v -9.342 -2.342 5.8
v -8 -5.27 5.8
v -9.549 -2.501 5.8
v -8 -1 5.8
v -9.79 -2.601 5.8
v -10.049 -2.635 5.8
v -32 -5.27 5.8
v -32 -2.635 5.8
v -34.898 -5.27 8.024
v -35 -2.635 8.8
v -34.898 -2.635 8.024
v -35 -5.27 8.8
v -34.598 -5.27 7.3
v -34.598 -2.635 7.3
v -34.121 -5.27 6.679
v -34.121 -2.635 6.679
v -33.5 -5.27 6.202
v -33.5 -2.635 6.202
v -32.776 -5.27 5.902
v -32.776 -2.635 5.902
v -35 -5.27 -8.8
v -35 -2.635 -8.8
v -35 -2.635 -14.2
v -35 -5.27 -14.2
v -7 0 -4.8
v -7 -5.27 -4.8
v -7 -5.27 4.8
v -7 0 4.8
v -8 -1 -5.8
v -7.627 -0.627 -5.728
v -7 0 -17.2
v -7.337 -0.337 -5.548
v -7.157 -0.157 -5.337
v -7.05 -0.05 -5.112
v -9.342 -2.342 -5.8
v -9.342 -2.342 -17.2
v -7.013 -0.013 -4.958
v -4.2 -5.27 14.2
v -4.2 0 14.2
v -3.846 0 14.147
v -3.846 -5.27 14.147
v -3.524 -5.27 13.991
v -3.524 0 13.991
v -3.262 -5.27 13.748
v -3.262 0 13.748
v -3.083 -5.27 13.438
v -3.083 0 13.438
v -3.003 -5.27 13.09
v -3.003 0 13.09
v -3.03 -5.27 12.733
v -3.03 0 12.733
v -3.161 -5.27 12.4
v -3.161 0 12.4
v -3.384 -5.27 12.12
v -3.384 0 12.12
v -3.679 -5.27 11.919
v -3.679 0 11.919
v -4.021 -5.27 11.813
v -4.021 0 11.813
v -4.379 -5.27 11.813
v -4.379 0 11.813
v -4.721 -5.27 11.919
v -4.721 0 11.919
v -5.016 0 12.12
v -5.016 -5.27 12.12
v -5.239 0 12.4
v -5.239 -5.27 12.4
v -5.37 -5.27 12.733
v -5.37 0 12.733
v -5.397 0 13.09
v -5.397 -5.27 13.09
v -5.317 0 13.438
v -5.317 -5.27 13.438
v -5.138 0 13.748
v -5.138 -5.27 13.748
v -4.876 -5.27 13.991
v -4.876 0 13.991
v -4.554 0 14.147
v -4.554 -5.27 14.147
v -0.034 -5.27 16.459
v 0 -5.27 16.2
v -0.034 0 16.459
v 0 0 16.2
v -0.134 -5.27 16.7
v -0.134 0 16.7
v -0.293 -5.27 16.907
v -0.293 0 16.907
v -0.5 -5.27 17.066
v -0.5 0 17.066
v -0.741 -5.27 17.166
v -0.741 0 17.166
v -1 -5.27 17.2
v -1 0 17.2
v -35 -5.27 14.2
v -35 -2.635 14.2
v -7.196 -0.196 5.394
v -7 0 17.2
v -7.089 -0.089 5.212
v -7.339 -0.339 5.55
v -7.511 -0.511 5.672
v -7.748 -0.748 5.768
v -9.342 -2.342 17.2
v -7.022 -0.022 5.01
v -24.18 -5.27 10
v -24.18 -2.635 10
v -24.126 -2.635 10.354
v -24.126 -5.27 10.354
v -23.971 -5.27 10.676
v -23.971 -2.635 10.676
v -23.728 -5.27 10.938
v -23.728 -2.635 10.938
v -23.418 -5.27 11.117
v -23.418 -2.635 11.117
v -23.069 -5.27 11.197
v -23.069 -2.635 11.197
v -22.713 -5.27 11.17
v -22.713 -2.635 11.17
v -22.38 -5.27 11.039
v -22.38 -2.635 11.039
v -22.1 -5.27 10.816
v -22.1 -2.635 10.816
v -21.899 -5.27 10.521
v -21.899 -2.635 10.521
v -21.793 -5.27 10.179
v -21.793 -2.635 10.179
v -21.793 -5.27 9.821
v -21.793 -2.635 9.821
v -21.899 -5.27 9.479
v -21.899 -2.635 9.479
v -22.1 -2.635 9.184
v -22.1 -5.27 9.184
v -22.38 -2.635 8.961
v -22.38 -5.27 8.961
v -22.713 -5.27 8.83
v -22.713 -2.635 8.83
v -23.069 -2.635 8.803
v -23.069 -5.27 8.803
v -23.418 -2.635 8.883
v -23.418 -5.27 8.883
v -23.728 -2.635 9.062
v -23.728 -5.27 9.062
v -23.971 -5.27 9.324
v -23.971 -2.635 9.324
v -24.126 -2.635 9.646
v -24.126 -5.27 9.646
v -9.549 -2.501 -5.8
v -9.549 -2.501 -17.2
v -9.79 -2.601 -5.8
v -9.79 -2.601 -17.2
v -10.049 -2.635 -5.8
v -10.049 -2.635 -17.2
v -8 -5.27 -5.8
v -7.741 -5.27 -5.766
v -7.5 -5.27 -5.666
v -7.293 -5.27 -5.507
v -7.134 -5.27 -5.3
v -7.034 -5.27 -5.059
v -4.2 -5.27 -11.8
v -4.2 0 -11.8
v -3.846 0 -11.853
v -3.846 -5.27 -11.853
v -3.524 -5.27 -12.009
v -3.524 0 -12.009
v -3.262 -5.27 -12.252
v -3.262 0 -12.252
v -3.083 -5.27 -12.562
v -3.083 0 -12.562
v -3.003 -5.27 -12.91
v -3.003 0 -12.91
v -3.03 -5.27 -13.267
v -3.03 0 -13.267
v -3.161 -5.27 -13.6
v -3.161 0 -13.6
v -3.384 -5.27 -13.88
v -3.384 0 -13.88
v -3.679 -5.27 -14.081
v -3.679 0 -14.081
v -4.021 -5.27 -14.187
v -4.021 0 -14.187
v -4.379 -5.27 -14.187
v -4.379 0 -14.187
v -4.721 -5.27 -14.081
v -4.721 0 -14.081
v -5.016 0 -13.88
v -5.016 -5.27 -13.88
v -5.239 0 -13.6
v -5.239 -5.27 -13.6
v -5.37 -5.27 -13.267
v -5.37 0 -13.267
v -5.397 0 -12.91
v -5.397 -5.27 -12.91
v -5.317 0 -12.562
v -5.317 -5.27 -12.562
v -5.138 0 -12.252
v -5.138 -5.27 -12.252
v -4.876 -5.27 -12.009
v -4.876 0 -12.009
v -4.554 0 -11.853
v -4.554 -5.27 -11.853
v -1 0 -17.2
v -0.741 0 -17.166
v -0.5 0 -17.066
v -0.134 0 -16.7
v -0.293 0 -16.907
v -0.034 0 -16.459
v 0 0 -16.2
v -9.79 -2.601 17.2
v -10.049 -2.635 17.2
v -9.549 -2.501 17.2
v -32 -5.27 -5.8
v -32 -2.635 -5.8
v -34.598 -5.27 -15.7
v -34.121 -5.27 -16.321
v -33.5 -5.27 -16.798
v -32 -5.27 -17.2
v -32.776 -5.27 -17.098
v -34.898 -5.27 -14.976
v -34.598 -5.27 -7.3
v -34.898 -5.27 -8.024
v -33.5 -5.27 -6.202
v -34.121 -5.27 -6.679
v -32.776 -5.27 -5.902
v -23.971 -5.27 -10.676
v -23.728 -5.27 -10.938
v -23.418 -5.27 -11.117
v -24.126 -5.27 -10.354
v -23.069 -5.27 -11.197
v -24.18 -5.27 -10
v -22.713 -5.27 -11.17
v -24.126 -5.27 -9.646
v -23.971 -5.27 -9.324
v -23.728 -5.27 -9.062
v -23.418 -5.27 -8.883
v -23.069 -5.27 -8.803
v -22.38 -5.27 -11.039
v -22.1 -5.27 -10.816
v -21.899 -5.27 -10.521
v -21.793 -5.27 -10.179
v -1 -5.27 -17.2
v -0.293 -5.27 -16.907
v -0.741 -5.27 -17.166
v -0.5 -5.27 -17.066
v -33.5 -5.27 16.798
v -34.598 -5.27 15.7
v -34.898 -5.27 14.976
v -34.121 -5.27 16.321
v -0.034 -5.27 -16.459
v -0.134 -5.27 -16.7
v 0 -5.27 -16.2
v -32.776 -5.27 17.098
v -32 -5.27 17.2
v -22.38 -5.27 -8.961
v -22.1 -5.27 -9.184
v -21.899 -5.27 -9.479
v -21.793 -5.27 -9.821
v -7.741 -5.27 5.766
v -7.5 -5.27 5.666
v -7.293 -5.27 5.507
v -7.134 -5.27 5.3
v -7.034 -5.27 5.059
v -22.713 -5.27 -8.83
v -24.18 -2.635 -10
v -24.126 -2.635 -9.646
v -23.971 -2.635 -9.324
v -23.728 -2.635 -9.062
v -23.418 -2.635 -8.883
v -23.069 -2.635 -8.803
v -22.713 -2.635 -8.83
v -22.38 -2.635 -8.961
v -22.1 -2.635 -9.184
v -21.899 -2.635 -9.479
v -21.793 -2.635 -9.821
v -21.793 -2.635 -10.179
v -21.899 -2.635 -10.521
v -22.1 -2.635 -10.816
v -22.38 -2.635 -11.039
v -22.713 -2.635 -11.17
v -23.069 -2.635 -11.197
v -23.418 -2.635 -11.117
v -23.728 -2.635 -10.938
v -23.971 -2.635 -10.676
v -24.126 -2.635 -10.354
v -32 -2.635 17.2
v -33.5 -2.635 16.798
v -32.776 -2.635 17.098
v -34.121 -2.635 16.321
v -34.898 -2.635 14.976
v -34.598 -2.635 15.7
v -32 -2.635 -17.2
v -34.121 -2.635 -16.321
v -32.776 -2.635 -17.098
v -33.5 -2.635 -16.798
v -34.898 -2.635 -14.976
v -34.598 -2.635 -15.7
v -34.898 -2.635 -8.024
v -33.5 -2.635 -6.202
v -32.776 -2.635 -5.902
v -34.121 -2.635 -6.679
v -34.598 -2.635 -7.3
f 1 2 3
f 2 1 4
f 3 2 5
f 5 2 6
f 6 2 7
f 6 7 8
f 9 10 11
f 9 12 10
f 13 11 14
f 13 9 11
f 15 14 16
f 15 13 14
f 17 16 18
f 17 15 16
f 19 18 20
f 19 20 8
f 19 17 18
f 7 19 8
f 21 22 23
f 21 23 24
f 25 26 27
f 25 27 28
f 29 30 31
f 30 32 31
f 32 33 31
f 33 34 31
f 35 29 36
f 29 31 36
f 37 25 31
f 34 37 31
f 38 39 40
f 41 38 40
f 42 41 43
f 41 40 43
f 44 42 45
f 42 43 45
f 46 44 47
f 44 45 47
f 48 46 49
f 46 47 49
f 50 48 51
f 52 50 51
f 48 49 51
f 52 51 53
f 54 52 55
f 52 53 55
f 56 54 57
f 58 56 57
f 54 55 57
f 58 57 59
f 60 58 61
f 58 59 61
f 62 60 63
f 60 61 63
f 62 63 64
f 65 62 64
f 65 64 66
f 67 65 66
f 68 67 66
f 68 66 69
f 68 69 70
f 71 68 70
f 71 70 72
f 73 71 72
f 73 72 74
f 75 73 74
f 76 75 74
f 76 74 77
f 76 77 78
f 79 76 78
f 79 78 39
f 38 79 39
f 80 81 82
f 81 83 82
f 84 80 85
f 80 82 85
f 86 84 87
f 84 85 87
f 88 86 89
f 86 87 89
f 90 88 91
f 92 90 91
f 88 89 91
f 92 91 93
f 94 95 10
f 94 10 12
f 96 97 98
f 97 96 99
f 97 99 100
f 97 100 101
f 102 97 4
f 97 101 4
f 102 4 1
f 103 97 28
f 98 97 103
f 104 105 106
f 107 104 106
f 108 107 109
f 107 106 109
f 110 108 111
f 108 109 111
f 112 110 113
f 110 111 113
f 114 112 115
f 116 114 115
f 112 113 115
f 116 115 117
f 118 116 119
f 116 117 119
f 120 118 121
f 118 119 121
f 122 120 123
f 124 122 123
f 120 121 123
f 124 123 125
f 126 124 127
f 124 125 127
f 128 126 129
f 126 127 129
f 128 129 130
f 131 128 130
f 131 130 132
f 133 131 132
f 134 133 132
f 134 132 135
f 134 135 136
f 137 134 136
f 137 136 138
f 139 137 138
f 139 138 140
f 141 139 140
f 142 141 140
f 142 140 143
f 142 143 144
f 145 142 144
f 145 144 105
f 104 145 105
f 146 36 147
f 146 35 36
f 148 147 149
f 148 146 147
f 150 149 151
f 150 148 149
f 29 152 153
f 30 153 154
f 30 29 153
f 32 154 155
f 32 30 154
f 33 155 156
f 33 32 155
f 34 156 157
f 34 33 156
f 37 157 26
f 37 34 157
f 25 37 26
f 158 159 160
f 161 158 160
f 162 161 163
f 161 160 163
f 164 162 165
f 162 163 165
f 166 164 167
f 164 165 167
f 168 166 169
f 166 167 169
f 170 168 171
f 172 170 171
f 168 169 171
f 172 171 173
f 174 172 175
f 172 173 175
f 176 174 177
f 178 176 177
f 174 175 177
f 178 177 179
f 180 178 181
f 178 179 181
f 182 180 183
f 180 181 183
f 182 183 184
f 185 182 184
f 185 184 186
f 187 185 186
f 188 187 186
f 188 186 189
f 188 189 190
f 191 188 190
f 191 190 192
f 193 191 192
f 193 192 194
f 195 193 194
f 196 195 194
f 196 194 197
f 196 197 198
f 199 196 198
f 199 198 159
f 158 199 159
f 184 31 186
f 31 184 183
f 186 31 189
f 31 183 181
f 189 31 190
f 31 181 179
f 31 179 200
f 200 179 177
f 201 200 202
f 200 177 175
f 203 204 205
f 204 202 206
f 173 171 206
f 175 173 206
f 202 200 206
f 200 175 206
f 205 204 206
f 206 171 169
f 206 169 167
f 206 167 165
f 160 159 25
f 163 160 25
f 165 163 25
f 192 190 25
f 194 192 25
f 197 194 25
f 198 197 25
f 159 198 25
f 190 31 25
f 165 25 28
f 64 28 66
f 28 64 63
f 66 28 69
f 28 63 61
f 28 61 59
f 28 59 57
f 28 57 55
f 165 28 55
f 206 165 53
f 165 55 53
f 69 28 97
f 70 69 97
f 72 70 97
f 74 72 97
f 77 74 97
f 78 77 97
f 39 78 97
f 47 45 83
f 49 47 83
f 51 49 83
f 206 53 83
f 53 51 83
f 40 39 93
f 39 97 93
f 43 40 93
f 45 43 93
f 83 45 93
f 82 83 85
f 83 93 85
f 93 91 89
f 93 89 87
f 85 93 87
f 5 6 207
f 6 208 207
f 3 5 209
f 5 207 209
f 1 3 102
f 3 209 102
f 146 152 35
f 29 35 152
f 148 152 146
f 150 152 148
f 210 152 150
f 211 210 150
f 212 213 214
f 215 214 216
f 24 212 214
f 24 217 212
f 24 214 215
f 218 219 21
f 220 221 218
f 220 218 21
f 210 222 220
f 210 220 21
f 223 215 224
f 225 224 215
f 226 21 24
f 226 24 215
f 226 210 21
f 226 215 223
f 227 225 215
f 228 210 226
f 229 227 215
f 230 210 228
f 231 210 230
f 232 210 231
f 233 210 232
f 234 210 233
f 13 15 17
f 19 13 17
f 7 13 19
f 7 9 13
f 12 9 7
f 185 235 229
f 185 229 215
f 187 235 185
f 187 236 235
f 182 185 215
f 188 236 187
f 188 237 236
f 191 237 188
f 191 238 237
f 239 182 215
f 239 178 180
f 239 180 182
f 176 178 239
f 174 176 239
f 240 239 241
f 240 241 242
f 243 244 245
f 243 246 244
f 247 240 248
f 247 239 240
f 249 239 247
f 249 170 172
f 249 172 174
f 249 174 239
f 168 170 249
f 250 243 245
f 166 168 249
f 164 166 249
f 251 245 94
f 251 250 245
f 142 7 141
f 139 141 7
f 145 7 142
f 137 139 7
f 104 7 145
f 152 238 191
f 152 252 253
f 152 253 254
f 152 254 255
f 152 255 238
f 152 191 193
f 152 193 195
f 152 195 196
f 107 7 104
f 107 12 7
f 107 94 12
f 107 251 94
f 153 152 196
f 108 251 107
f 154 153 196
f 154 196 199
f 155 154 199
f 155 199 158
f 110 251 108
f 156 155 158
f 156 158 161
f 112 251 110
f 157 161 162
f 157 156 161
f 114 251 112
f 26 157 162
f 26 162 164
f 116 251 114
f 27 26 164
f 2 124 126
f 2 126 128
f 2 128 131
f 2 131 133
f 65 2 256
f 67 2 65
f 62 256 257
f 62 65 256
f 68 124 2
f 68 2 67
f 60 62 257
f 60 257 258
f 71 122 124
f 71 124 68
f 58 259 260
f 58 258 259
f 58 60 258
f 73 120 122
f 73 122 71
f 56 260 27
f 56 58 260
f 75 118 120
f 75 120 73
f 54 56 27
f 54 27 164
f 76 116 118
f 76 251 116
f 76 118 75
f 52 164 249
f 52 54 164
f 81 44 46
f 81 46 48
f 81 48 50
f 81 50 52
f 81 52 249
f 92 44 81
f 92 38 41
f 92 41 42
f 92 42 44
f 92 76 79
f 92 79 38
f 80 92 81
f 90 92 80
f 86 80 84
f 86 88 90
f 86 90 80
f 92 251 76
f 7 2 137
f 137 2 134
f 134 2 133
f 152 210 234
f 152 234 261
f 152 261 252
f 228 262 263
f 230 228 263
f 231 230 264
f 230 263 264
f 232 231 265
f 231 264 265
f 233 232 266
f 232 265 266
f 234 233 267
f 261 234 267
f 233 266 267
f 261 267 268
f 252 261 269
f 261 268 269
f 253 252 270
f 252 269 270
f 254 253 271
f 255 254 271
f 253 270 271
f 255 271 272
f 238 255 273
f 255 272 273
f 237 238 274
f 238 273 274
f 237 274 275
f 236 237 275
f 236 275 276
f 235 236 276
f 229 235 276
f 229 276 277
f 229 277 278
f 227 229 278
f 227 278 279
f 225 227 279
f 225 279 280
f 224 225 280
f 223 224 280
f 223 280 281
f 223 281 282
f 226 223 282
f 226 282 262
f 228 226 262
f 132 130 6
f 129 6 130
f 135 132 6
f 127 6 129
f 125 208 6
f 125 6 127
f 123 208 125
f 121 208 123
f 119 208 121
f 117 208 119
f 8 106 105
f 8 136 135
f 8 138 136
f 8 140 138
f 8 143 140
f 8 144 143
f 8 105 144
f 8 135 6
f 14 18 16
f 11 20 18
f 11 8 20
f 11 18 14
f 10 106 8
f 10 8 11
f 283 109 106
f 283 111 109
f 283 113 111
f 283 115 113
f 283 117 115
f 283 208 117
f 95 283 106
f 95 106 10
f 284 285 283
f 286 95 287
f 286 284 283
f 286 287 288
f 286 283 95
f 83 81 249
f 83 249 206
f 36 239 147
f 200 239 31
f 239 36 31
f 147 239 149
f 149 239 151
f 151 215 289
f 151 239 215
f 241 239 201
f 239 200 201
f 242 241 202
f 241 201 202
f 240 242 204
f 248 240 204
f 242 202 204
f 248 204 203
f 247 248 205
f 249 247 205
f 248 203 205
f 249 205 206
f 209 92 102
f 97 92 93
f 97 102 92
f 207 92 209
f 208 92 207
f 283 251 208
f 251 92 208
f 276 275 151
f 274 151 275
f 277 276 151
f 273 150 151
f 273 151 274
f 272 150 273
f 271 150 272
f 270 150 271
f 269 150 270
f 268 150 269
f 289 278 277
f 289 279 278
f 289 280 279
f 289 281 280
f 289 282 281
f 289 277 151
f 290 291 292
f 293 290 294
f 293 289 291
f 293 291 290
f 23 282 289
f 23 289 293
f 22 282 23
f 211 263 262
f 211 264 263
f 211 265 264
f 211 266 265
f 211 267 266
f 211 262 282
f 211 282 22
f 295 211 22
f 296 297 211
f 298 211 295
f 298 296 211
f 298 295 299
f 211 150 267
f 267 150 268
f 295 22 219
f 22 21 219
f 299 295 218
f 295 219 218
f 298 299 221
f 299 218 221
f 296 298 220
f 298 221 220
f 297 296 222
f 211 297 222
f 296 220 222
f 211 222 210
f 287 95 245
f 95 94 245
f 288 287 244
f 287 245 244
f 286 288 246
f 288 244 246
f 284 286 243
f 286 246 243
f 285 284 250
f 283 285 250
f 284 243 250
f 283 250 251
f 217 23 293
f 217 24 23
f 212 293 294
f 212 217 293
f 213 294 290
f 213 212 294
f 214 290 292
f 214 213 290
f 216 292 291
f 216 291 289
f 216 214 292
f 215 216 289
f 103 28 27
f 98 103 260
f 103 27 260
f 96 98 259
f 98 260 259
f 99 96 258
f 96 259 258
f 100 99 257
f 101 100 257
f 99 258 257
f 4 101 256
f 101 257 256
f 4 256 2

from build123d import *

# Parameters (mm, degrees)
SKETCH1_W           = 7
SKETCH1_H           = 2.635
BOSS_EXTRUDE1_DEPTH = 17.2
CUT_EXTRUDE1_REACH  = 41.352
SKETCH2_R           = 1.2
CUT_EXTRUDE2_REACH  = 41.087
SKETCH3_R           = 1.2
SKETCH3_W           = 28
SKETCH3_H           = 11.6
CHAMFER1_SIZE       = 2.635
FILLET2_R           = 1
FILLET3_R           = 3
FILLET4_R           = 1


with BuildPart() as part:
    # Sketch1 → Boss-Extrude1 (new, symmetric)
    with BuildSketch(Plane.XY):
        Polygon((0, -5.27), (0, -2.635), (-7, -2.635), (-35, -2.635), (-35, -5.27), align=None)
        with Locations((-3.5, -1.3175)):
            Rectangle(SKETCH1_W, SKETCH1_H)
    extrude(amount=BOSS_EXTRUDE1_DEPTH, both=True)

    # Sketch2 → Cut-Extrude1 (cut, up to next)
    with BuildSketch(Plane(origin=(0, 0, 0), x_dir=(1, 0, 0), z_dir=(0, 1, 0)), mode=Mode.PRIVATE) as cut_extrude1_sk1:
        with Locations(Location((-4.2, 13, 0), (0, 0, 270))):
            Circle(SKETCH2_R)
    cut_extrude1_tool1 = extrude(cut_extrude1_sk1.sketch, amount=-CUT_EXTRUDE1_REACH, mode=Mode.PRIVATE) & part.part
    # Sketch2 → Cut-Extrude1 (cut, up to next)
    with BuildSketch(Plane(origin=(0, 0, 0), x_dir=(1, 0, 0), z_dir=(0, 1, 0)), mode=Mode.PRIVATE) as cut_extrude1_sk2:
        with Locations(Location((-4.2, -13, 0), (0, 0, 270))):
            Circle(SKETCH2_R)
    cut_extrude1_tool2 = extrude(cut_extrude1_sk2.sketch, amount=-CUT_EXTRUDE1_REACH, mode=Mode.PRIVATE) & part.part
    add(cut_extrude1_tool1.solids().sort_by_distance((-4.2, 0, -13))[0], mode=Mode.SUBTRACT)
    add(cut_extrude1_tool2.solids().sort_by_distance((-4.2, 0, 13))[0], mode=Mode.SUBTRACT)

    # Sketch3 → Cut-Extrude2 (cut, up to next)
    with BuildSketch(Plane(origin=(0, -2.635, 0), x_dir=(1, 0, 0), z_dir=(0, 1, 0)), mode=Mode.PRIVATE) as cut_extrude2_sk1:
        with Locations(Location((-22.979761, 10, 0), (0, 0, 180))):
            Circle(SKETCH3_R)
    cut_extrude2_tool1 = extrude(cut_extrude2_sk1.sketch, amount=-CUT_EXTRUDE2_REACH, mode=Mode.PRIVATE) & part.part
    # Sketch3 → Cut-Extrude2 (cut, up to next)
    with BuildSketch(Plane(origin=(0, -2.635, 0), x_dir=(1, 0, 0), z_dir=(0, 1, 0)), mode=Mode.PRIVATE) as cut_extrude2_sk2:
        with Locations(Location((-22.979761, -10, 0), (0, 0, 180))):
            Circle(SKETCH3_R)
    cut_extrude2_tool2 = extrude(cut_extrude2_sk2.sketch, amount=-CUT_EXTRUDE2_REACH, mode=Mode.PRIVATE) & part.part
    # Sketch3 → Cut-Extrude2 (cut, up to next)
    with BuildSketch(Plane(origin=(0, -2.635, 0), x_dir=(1, 0, 0), z_dir=(0, 1, 0)), mode=Mode.PRIVATE) as cut_extrude2_sk3:
        with Locations((-21, 0)):
            Rectangle(SKETCH3_W, SKETCH3_H)
    cut_extrude2_tool3 = extrude(cut_extrude2_sk3.sketch, amount=-CUT_EXTRUDE2_REACH, mode=Mode.PRIVATE) & part.part
    add(cut_extrude2_tool1.solids().sort_by_distance((-22.979761, -2.635, -10))[0], mode=Mode.SUBTRACT)
    add(cut_extrude2_tool2.solids().sort_by_distance((-22.979761, -2.635, 10))[0], mode=Mode.SUBTRACT)
    add(cut_extrude2_tool3.solids().sort_by_distance((-21, -2.635, 0))[0], mode=Mode.SUBTRACT)

    # Chamfer1
    # the kernel refuses this chamfer: 2.635 mm, written as the material it adds along each edge
    with BuildSketch(Plane(origin=(-7, -2.635, 5.8), x_dir=(0.027495876610586358, 0.9996219169112968, 0), z_dir=(0, 0, 1))) as chamfer1_piece_1_section:
        Polygon((CHAMFER1_SIZE * 0.999621916911, CHAMFER1_SIZE * 0.0274958766106), (-CHAMFER1_SIZE * 0.0274958766106, CHAMFER1_SIZE * 0.999621916911), (0, 0), align=None)
    chamfer1_piece_1 = extrude(amount=11.4, mode=Mode.PRIVATE)
    chamfer1_piece_1 = split(chamfer1_piece_1, bisect_by=Plane(origin=(-7.870614947, 0, 11.5), z_dir=(0, -1, 0)), keep=Keep.TOP, mode=Mode.PRIVATE)
    add(chamfer1_piece_1)
    with BuildSketch(Plane(origin=(-7, -2.635, -17.2), x_dir=(0.027495876610586358, 0.9996219169112968, 0), z_dir=(0, 0, 1))) as chamfer1_piece_2_section:
        Polygon((CHAMFER1_SIZE * 0.999621916911, CHAMFER1_SIZE * 0.0274958766106), (-CHAMFER1_SIZE * 0.0274958766106, CHAMFER1_SIZE * 0.999621916911), (0, 0), align=None)
    chamfer1_piece_2 = extrude(amount=11.4, mode=Mode.PRIVATE)
    chamfer1_piece_2 = split(chamfer1_piece_2, bisect_by=Plane(origin=(-7.870614947, 0, -11.5), z_dir=(0, -1, 0)), keep=Keep.TOP, mode=Mode.PRIVATE)
    add(chamfer1_piece_2)

    # Fillet2
    fillet2_edges = [part.edges().sort_by_distance(p)[0] for p in [
        (-7, -2.635, -5.8),
        (-7, -2.635, 5.8),
        (-9.635, -2.635, 11.5),
        (-9.635, -2.635, -11.5),
    ]]
    fillet(fillet2_edges, radius=FILLET2_R)

    # Fillet3
    fillet3_edges = [part.edges().sort_by_distance(p)[0] for p in [
        (-35, -3.9525, -17.2),
        (-35, -3.9525, 17.2),
        (-35, -3.9525, 5.8),
        (-35, -3.9525, -5.8),
    ]]
    fillet(fillet3_edges, radius=FILLET3_R)

    # Fillet4
    fillet4_edges = [part.edges().sort_by_distance(p)[0] for p in [
        (0, -2.635, 17.2),
        (0, -2.635, -17.2),
    ]]
    fillet(fillet4_edges, radius=FILLET4_R)


solid = part.part
